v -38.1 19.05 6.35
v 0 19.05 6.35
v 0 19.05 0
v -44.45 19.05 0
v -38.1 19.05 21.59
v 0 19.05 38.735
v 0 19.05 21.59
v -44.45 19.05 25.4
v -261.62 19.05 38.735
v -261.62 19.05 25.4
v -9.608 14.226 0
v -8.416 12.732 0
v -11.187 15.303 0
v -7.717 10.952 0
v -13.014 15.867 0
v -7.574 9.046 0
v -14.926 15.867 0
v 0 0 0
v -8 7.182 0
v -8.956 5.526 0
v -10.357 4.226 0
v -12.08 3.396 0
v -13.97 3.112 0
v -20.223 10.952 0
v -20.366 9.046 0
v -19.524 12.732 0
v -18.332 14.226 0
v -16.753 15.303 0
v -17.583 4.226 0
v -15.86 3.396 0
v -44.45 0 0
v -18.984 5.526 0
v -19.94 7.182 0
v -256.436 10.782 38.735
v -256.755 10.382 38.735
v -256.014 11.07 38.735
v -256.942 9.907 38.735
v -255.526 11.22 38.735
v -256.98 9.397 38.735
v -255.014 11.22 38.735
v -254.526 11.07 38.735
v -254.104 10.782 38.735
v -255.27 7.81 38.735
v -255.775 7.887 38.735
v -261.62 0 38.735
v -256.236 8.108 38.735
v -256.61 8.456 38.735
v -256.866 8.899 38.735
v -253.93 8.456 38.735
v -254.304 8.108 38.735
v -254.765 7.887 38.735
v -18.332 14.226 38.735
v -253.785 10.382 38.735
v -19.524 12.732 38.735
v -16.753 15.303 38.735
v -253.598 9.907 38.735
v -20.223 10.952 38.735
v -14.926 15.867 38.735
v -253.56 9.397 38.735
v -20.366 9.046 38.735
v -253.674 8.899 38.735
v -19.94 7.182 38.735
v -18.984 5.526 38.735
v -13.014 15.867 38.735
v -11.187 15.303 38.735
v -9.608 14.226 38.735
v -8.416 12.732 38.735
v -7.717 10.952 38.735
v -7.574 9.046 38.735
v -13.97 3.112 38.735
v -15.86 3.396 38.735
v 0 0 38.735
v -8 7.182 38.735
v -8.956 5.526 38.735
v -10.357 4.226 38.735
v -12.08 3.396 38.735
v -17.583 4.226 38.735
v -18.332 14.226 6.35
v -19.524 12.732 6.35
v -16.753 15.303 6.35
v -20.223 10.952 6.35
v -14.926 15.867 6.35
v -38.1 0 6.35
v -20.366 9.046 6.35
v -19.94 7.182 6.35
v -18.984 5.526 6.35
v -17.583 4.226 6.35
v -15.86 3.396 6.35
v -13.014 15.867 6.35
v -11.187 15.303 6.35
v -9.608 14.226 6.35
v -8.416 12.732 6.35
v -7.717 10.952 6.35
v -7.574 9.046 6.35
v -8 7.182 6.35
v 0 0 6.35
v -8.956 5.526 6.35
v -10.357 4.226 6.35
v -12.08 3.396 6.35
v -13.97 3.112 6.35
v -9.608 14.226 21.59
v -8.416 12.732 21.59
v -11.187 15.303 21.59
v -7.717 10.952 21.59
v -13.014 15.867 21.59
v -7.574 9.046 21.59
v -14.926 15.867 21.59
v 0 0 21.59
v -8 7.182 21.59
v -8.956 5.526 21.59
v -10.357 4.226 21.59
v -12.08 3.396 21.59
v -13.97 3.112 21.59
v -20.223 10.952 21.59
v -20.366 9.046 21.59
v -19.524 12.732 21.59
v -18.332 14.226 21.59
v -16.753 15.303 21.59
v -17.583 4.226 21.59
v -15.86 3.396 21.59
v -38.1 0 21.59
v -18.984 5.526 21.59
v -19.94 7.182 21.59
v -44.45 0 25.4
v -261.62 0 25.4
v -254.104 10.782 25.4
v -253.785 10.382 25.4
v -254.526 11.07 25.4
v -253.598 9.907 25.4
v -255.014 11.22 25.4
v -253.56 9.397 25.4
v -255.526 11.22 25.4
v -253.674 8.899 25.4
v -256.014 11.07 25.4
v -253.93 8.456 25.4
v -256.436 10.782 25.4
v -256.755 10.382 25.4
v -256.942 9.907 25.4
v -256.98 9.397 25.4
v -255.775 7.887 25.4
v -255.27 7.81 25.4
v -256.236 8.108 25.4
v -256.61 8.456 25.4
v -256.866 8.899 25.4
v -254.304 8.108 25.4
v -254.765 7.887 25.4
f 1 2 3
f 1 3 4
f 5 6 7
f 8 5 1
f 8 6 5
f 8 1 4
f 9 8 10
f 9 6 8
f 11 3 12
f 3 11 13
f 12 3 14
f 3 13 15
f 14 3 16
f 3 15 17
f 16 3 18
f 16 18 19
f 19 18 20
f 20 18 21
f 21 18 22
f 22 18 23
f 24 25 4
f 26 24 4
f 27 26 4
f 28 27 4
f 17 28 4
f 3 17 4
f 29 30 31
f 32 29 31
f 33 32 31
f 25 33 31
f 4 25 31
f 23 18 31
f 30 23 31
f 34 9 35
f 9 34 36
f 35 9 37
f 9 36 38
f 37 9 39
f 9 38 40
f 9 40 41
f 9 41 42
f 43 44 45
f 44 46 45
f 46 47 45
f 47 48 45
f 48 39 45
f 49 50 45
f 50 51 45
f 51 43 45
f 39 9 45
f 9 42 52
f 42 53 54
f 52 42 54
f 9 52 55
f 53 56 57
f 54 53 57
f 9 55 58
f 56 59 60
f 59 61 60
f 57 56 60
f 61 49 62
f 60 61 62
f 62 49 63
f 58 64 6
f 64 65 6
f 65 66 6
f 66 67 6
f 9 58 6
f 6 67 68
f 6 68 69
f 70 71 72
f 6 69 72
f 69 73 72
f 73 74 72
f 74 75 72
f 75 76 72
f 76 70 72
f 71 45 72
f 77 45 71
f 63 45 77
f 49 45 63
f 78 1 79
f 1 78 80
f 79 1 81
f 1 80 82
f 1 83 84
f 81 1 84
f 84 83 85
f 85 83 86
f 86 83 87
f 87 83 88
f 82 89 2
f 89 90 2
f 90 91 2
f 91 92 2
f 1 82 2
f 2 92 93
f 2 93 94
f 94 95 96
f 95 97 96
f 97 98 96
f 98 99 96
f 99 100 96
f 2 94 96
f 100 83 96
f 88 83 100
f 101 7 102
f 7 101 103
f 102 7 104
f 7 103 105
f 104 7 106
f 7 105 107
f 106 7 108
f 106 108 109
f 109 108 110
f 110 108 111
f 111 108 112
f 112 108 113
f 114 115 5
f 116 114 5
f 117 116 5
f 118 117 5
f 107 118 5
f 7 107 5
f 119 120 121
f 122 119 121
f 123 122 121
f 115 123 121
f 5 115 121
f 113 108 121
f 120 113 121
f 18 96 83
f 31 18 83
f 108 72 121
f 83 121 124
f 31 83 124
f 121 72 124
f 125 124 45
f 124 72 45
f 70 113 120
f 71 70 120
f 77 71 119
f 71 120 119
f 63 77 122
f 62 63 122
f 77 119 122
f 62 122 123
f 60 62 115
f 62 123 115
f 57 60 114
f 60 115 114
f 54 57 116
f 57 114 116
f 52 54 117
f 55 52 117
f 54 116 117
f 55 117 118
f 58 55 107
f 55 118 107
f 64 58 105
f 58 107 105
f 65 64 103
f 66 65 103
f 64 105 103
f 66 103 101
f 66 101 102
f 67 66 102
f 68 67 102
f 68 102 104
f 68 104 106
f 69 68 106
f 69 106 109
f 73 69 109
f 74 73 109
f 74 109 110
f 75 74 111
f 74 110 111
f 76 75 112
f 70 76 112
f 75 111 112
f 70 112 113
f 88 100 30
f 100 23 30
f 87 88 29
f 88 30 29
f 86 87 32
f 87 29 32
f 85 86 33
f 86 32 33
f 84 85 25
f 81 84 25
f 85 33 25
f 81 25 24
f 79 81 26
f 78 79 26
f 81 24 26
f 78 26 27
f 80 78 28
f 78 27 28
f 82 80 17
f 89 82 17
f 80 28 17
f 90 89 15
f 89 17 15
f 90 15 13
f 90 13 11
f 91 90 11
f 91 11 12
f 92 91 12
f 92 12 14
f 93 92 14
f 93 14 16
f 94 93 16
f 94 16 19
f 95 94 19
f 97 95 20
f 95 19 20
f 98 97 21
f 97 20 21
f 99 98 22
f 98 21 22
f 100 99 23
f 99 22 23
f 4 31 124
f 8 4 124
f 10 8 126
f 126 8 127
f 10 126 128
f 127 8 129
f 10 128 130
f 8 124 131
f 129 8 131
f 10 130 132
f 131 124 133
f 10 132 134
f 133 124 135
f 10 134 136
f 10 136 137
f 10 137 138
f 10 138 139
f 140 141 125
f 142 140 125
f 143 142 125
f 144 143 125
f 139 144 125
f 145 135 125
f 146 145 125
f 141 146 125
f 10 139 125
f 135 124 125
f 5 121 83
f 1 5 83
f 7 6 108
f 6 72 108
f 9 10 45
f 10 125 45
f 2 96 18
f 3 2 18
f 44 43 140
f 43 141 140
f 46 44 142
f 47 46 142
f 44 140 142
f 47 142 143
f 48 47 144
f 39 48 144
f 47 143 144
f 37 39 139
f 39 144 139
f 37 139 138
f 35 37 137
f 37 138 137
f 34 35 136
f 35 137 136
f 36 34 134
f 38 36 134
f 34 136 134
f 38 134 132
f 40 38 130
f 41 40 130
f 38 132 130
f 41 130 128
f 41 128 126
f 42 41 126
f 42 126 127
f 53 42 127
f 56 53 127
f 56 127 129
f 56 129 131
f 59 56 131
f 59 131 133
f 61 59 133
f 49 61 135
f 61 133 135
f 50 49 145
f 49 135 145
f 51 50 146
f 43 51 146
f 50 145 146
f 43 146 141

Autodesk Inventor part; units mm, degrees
ref_plane "YZ Plane" through (0, 0, 0) normal (1, 0, 0) x (0, 1, 0)
ref_plane "XZ Plane" through (0, 0, 0) normal (0, 1, 0) x (-1, 0, 0)
ref_plane "XY Plane" through (0, 0, 0) normal (0, 0, 1) x (1, 0, 0)
sketch "Sketch1" plane through (0, 0, 0) normal (0, 1, 0) x (-1, 0, 0)
  line L0 (0, 0) -> (44.45, 0)
  line L1 (44.45, 0) -> (44.45, 25.4)
  line L2 (44.45, 25.4) -> (261.62, 25.4)
  line L3 (261.62, 25.4) -> (261.62, 38.735)
  line L4 (261.62, 38.735) -> (0, 38.735)
  line L5 (0, 38.735) -> (0, 0)
  line L6 (0, 21.59) -> (38.1, 21.59)
  line L7 (38.1, 21.59) -> (38.1, 6.35)
  line L8 (38.1, 6.35) -> (0, 6.35)
  line L9 (0, 6.35) -> (0, 21.59)
  dimension "d9" = 44.45
  dimension "d10" = 25.4
  dimension "d17" = 261.62
  dimension "d24" = 38.735
  dimension "d26" = 15.24
  dimension "d27" = 6.35
  dimension "d50" = 217.17
  dimension "d51" = 6.35
extrude "Extrusion1" add sketch "Sketch1" along normal blind 19.05 contours L5 L8 L7 L6 L4 L3 L2 L1 L0
sketch "Sketch2" plane through (-261.62, 0, 38.735) normal (0, 0, 1) x (1, 0, 0)
  line L0 (261.62, 0) -> (261.62, 19.05) projected
  line L1 (0, 19.05) -> (261.62, 19.05) projected
  point P0 (247.65, 9.525)
  dimension "d37" = 13.97
  dimension "d38" = 19.05
  dimension "d39" = 9.525
hole "Hole1" at (-13.97, 9.525, 38.735) direction (0, 0, -1) diameter 12.827 end through all
sketch "Sketch3" plane through (-261.62, 0, 38.735) normal (0, 0, 1) x (1, 0, 0)
  line L0 (0, 0) -> (0, 19.05) projected
  line L1 (0, 19.05) -> (261.62, 19.05) projected
  point P0 (261.62, 0)
  point P1 (6.35, 9.525)
  dimension "d47" = 19.05
  dimension "d48" = 9.525
  dimension "d49" = 6.35
hole "Hole2" at (-255.27, 9.525, 38.735) direction (0, 0, -1) diameter 3.429 end through all
equation "\"d50\" = d17 - d9"
equation "\"d39\" = 0.5 * d38"
equation "\"d48\" = 0.5 * d47"
properties part number "shooter launch bar"
